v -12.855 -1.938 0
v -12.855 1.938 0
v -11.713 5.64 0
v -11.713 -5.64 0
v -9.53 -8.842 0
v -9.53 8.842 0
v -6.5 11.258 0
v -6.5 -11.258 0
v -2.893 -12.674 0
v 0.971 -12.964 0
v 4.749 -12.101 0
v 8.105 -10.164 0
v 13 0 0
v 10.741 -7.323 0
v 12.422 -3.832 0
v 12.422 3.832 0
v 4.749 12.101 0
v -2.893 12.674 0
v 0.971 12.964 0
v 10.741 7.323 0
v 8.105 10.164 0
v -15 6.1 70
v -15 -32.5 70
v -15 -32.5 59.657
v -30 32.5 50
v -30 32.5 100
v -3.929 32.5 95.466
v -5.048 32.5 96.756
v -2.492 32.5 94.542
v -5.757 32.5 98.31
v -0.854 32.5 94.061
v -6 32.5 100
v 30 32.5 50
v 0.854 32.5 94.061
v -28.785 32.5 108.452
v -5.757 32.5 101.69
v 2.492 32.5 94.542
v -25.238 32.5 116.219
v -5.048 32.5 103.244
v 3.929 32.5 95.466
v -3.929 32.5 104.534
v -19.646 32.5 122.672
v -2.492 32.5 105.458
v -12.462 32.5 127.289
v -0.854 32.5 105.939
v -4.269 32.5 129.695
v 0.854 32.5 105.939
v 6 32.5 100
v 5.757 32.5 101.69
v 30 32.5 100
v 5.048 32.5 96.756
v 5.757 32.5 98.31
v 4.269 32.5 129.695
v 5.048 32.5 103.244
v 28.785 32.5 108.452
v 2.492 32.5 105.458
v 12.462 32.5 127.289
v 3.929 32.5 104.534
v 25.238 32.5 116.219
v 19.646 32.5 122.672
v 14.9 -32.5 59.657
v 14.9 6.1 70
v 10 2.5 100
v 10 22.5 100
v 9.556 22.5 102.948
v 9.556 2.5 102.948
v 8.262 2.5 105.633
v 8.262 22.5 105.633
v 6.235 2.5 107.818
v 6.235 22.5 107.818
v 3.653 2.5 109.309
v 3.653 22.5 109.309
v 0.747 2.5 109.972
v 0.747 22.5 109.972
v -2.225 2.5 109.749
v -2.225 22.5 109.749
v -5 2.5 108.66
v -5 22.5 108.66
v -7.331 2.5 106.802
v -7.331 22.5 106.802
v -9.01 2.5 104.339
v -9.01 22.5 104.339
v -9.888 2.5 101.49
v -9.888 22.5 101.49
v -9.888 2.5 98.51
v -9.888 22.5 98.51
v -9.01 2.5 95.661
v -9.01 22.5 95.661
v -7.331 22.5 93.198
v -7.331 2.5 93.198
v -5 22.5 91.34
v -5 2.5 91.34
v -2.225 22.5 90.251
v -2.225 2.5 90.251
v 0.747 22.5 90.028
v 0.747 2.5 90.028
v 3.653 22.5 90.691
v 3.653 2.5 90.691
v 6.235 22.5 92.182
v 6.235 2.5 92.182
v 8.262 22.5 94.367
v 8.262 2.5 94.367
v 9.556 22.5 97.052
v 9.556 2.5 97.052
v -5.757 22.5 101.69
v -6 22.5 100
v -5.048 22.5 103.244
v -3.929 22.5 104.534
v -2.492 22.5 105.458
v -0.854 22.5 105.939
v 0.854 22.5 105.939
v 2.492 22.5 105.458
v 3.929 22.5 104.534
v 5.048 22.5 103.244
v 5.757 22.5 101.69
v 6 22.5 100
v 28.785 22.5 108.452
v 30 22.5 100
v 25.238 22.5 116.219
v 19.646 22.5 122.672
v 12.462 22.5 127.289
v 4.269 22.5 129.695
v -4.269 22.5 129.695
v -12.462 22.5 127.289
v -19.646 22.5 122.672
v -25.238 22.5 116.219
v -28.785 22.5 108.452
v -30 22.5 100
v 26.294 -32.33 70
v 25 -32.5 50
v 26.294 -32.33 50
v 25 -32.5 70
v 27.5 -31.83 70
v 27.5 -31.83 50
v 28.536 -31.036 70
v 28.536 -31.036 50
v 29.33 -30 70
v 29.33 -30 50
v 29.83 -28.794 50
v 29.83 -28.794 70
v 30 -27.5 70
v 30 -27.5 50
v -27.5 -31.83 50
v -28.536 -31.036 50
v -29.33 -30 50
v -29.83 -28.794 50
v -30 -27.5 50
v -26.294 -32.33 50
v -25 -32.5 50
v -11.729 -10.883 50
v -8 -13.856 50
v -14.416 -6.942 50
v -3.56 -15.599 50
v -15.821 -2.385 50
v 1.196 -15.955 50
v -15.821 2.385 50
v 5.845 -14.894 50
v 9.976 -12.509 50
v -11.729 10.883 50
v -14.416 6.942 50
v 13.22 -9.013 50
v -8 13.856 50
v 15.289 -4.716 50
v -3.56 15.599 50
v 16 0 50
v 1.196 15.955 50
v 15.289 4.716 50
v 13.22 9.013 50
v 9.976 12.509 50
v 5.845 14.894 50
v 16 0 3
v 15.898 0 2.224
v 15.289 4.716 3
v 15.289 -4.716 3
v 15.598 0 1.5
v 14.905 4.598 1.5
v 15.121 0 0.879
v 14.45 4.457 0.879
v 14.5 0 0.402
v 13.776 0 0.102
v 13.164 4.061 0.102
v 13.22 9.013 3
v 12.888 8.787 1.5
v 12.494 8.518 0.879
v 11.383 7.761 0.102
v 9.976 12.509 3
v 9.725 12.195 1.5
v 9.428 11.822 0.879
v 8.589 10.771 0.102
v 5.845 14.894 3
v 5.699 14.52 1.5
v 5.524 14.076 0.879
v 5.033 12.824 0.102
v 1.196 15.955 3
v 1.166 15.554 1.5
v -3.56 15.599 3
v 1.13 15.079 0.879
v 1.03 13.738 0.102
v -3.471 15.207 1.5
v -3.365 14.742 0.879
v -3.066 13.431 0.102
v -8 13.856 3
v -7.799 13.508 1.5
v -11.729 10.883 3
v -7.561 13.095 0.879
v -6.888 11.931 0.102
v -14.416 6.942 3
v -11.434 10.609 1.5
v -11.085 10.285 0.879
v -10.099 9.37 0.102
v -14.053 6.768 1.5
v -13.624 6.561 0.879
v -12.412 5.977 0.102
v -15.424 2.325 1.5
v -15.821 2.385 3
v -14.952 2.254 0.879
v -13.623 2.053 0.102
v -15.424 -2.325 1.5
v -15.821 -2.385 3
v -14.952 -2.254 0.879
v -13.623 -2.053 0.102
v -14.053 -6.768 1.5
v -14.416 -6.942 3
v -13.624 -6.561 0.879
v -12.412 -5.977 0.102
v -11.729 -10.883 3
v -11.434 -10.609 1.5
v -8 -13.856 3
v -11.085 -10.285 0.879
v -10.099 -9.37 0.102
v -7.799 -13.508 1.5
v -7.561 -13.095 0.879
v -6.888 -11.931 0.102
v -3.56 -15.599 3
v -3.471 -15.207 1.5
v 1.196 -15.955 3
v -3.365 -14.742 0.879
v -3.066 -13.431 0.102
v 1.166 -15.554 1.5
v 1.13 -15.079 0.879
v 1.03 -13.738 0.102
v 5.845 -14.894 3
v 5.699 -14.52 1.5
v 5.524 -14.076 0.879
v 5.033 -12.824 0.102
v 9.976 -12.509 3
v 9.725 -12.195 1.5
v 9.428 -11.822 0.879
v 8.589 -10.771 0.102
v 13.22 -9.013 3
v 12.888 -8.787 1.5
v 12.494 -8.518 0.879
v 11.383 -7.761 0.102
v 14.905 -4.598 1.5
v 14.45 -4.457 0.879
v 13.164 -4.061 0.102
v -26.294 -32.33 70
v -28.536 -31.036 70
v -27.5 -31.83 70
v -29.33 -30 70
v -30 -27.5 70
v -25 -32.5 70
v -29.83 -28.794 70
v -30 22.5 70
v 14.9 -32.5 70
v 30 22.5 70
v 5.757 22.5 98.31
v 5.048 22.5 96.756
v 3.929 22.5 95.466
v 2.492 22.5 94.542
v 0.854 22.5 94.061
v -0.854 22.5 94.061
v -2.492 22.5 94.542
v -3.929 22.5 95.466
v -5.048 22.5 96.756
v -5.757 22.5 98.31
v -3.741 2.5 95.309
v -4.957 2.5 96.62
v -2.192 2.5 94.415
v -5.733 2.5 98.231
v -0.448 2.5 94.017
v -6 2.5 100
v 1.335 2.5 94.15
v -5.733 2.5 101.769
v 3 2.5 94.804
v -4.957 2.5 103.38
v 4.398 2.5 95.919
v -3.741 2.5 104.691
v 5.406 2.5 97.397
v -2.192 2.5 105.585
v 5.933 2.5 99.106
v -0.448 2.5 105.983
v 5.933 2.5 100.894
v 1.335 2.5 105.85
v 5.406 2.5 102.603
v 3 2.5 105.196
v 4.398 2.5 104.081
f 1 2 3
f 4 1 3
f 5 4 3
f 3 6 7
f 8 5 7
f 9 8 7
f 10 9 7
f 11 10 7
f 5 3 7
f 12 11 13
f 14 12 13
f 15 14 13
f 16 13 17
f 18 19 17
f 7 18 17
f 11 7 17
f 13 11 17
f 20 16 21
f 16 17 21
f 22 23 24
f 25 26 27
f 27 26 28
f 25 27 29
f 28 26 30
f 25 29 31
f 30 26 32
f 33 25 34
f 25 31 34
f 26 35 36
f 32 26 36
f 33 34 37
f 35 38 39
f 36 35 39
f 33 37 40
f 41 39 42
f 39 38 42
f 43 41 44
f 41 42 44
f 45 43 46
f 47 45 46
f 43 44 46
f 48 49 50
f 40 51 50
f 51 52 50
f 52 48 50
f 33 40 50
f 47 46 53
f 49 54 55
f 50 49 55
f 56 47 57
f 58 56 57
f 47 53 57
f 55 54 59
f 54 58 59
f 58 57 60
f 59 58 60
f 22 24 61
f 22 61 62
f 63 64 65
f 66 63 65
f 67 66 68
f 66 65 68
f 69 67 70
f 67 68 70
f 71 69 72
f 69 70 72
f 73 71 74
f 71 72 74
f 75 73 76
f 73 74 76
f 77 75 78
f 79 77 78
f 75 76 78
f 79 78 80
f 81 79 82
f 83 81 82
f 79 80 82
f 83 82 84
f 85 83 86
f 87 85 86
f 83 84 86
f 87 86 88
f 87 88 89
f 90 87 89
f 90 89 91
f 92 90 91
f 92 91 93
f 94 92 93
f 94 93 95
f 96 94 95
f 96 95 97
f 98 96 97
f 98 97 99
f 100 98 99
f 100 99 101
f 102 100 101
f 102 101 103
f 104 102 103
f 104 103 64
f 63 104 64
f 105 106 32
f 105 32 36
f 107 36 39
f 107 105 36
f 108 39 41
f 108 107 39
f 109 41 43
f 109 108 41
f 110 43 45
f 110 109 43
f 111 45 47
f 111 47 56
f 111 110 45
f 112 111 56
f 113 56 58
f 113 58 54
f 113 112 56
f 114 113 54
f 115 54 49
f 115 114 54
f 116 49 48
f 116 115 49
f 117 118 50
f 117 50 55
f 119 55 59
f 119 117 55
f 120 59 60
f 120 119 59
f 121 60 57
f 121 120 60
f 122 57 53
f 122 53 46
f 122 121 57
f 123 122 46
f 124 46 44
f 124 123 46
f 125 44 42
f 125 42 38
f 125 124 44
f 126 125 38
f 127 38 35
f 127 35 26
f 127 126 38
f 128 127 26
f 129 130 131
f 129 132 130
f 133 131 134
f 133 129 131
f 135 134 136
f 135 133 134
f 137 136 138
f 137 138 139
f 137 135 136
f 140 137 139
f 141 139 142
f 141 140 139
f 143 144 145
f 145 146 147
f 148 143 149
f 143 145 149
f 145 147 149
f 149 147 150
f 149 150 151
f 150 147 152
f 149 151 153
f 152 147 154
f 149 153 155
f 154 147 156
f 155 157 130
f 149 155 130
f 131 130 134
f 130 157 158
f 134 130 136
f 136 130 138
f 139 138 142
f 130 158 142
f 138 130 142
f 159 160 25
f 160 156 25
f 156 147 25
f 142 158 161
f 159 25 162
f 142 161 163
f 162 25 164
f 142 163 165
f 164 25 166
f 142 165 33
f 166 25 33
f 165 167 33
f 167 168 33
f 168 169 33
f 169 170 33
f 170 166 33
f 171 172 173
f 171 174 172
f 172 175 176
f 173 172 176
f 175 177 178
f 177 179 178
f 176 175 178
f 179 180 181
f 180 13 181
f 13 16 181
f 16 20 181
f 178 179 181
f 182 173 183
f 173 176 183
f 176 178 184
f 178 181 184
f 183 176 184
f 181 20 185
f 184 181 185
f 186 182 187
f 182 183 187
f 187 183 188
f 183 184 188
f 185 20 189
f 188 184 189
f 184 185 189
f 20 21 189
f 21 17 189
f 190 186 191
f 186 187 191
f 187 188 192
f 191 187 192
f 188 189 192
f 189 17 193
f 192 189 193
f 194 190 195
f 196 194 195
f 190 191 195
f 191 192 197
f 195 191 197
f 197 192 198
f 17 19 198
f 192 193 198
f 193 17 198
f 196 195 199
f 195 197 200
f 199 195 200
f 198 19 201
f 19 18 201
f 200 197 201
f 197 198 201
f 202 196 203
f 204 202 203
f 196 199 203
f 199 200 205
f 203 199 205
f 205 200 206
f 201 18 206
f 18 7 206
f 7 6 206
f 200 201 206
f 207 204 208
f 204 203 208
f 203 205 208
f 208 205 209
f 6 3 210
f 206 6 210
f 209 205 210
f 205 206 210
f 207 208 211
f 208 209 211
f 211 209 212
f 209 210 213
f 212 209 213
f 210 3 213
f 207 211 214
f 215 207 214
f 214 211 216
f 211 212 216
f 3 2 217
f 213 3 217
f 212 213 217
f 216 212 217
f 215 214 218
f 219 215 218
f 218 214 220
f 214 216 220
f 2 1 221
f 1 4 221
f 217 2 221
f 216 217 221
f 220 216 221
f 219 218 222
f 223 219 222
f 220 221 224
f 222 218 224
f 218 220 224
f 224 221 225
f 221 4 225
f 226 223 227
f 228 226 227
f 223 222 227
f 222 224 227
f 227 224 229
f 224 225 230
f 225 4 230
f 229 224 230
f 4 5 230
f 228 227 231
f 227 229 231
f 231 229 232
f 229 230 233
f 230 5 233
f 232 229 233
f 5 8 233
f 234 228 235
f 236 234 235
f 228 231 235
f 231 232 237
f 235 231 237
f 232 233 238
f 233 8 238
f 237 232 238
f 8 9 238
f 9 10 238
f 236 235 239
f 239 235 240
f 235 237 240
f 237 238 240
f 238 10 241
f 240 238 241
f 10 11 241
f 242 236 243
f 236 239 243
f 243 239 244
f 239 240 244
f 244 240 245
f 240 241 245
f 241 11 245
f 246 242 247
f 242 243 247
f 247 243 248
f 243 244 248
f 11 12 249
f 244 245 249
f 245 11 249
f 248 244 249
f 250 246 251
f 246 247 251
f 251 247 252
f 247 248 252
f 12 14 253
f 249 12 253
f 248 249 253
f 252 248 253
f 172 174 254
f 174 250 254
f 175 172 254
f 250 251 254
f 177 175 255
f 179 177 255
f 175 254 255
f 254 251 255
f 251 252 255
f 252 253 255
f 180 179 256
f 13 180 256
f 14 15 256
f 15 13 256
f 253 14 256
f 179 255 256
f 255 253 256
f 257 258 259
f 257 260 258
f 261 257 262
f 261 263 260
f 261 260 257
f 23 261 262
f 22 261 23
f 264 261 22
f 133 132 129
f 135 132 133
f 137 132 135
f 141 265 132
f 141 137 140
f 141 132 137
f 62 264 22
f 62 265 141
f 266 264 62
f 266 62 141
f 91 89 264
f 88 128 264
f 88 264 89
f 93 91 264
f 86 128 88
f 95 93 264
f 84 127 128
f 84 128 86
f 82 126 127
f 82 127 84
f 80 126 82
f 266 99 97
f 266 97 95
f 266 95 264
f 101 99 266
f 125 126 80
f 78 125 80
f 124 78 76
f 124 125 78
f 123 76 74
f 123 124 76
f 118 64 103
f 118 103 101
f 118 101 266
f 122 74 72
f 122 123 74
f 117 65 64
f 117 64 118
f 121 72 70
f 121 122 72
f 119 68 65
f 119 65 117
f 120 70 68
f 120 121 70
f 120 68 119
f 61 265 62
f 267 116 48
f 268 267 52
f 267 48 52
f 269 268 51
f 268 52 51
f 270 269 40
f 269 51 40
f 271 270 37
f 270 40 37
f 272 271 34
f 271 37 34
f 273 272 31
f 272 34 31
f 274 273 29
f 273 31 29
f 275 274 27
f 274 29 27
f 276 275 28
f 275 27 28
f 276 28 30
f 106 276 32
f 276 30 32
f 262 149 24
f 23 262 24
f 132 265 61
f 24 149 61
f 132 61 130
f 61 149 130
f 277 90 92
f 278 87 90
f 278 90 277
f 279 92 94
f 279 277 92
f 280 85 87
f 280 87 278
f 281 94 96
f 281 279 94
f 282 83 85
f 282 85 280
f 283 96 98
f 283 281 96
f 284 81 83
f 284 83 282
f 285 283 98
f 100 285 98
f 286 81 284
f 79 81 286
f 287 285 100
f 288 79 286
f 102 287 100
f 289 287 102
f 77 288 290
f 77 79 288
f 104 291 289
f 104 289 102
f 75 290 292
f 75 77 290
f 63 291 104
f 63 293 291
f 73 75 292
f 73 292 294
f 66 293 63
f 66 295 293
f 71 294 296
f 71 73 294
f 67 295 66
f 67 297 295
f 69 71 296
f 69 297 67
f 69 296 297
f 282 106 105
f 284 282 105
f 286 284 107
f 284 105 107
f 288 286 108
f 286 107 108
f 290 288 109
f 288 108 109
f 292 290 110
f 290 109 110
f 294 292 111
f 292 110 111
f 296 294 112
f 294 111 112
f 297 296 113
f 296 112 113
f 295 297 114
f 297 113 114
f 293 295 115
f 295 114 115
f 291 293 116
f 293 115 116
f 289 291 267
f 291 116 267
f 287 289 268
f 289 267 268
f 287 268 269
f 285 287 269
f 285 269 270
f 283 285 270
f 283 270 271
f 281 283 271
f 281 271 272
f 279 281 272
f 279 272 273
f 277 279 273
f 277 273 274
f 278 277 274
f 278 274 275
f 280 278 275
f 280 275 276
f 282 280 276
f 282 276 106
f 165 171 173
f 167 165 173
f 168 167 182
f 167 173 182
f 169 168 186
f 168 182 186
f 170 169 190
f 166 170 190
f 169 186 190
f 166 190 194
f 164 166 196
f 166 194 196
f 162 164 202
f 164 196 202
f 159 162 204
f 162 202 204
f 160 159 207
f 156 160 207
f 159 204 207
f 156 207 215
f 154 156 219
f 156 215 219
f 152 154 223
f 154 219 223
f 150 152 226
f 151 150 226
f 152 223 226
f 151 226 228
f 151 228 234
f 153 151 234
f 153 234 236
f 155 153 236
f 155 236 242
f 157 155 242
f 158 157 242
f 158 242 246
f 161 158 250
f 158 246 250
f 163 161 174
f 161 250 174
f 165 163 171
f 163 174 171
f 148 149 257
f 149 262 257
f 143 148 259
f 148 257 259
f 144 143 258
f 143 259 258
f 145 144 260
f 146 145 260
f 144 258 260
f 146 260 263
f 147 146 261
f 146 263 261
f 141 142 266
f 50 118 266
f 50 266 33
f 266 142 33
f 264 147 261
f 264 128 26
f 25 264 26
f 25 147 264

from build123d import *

# Parameters (mm, degrees)
F0_R           = 16
F1_DEPTH       = 50
F2_R           = 16
F3_DEPTH       = 20
F2_W           = 60
F2_H           = 10
F4_DEPTH       = 50
F6_DEPTH       = 20
F6_DEPTH_BACK  = 10
F7_DEPTH       = 20
F7_DEPTH_BACK  = 10
F8_DEPTH       = 10
F9_R           = 5
F10_R          = 5
F12_DEPTH      = 15
F12_DEPTH_BACK = 14.9
F13_R          = 3


with BuildPart() as f1:
    # F0 (on Top) → F1 (new body)
    with BuildSketch(Plane.XY):
        Circle(F0_R)
    extrude(amount=F1_DEPTH)

    # F2 (on face) → F3 (join)
    with BuildSketch(Plane.XY.offset(50)):
        Polygon((-30, 22.5), (-30, 0), (-30, -32.5), (30, -32.5), (30, 0), (30, 22.5), align=None)
        Circle(F2_R, mode=Mode.SUBTRACT)
        Circle(F2_R)
    extrude(amount=F3_DEPTH)

    # F2 (on face) → F4 (join)
    with BuildSketch(Plane.XY.offset(50)):
        with Locations((0, 27.5)):
            Rectangle(F2_W, F2_H)
    extrude(amount=F4_DEPTH)

    # F5 (on face) → F6 (cut, two sides)
    with BuildSketch(Plane.XZ.offset(-22.5)) as f6_sk:
        with BuildLine():
            ThreePointArc((-6, 100), (0, 94), (6, 100))
            Line((6, 100), (-6, 100))
        make_face()
        with BuildLine():
            Line((-6, 100), (6, 100))
            ThreePointArc((6, 100), (0, 106), (-6, 100))
        make_face()
    extrude(amount=F6_DEPTH, mode=Mode.SUBTRACT)
    extrude(f6_sk.sketch, amount=-F6_DEPTH_BACK, mode=Mode.SUBTRACT)

    # F5 (on face) → F7 (join, two sides)
    with BuildSketch(Plane.XZ.offset(-22.5)) as f7_sk:
        with BuildLine():
            ThreePointArc((-10, 100), (0, 90), (10, 100))
            Line((10, 100), (6, 100))
            ThreePointArc((6, 100), (0, 94), (-6, 100))
            Line((-6, 100), (-10, 100))
        make_face()
        with BuildLine():
            Line((6, 100), (10, 100))
            ThreePointArc((10, 100), (0, 110), (-10, 100))
            Line((-10, 100), (-6, 100))
            ThreePointArc((-6, 100), (0, 106), (6, 100))
        make_face()
    extrude(amount=F7_DEPTH)
    extrude(f7_sk.sketch, amount=-F7_DEPTH_BACK)

    # F5 (on face) → F8 (join)
    with BuildSketch(Plane.XZ.offset(-22.5)):
        with BuildLine():
            Line((10, 100), (30, 100))
            ThreePointArc((30, 100), (0, 130), (-30, 100))
            Line((-30, 100), (-10, 100))
            ThreePointArc((-10, 100), (0, 110), (10, 100))
        make_face()
    extrude(amount=-F8_DEPTH)

    # F9
    f9_edges = [f1.edges().sort_by_distance(p)[0] for p in [
        (30, -32.5, 60),
    ]]
    fillet(f9_edges, radius=F9_R)

    # F10
    f10_edges = [f1.edges().sort_by_distance(p)[0] for p in [
        (-30, -32.5, 60),
    ]]
    fillet(f10_edges, radius=F10_R)

    # F11 (on Right) → F12 (cut, two sides)
    with BuildSketch(Plane.YZ) as f12_sk:
        Polygon((6.397780925, 70.0798109174), (-32.611630857, 70.0798109174), (-32.611630857, 59.6272705332), align=None)
    extrude(amount=-F12_DEPTH, mode=Mode.SUBTRACT)
    extrude(f12_sk.sketch, amount=F12_DEPTH_BACK, mode=Mode.SUBTRACT)

    # F13
    f13_edges = [f1.edges().sort_by_distance(p)[0] for p in [
        (-16, 0, 0),
    ]]
    fillet(f13_edges, radius=F13_R)


solid = f1.part
